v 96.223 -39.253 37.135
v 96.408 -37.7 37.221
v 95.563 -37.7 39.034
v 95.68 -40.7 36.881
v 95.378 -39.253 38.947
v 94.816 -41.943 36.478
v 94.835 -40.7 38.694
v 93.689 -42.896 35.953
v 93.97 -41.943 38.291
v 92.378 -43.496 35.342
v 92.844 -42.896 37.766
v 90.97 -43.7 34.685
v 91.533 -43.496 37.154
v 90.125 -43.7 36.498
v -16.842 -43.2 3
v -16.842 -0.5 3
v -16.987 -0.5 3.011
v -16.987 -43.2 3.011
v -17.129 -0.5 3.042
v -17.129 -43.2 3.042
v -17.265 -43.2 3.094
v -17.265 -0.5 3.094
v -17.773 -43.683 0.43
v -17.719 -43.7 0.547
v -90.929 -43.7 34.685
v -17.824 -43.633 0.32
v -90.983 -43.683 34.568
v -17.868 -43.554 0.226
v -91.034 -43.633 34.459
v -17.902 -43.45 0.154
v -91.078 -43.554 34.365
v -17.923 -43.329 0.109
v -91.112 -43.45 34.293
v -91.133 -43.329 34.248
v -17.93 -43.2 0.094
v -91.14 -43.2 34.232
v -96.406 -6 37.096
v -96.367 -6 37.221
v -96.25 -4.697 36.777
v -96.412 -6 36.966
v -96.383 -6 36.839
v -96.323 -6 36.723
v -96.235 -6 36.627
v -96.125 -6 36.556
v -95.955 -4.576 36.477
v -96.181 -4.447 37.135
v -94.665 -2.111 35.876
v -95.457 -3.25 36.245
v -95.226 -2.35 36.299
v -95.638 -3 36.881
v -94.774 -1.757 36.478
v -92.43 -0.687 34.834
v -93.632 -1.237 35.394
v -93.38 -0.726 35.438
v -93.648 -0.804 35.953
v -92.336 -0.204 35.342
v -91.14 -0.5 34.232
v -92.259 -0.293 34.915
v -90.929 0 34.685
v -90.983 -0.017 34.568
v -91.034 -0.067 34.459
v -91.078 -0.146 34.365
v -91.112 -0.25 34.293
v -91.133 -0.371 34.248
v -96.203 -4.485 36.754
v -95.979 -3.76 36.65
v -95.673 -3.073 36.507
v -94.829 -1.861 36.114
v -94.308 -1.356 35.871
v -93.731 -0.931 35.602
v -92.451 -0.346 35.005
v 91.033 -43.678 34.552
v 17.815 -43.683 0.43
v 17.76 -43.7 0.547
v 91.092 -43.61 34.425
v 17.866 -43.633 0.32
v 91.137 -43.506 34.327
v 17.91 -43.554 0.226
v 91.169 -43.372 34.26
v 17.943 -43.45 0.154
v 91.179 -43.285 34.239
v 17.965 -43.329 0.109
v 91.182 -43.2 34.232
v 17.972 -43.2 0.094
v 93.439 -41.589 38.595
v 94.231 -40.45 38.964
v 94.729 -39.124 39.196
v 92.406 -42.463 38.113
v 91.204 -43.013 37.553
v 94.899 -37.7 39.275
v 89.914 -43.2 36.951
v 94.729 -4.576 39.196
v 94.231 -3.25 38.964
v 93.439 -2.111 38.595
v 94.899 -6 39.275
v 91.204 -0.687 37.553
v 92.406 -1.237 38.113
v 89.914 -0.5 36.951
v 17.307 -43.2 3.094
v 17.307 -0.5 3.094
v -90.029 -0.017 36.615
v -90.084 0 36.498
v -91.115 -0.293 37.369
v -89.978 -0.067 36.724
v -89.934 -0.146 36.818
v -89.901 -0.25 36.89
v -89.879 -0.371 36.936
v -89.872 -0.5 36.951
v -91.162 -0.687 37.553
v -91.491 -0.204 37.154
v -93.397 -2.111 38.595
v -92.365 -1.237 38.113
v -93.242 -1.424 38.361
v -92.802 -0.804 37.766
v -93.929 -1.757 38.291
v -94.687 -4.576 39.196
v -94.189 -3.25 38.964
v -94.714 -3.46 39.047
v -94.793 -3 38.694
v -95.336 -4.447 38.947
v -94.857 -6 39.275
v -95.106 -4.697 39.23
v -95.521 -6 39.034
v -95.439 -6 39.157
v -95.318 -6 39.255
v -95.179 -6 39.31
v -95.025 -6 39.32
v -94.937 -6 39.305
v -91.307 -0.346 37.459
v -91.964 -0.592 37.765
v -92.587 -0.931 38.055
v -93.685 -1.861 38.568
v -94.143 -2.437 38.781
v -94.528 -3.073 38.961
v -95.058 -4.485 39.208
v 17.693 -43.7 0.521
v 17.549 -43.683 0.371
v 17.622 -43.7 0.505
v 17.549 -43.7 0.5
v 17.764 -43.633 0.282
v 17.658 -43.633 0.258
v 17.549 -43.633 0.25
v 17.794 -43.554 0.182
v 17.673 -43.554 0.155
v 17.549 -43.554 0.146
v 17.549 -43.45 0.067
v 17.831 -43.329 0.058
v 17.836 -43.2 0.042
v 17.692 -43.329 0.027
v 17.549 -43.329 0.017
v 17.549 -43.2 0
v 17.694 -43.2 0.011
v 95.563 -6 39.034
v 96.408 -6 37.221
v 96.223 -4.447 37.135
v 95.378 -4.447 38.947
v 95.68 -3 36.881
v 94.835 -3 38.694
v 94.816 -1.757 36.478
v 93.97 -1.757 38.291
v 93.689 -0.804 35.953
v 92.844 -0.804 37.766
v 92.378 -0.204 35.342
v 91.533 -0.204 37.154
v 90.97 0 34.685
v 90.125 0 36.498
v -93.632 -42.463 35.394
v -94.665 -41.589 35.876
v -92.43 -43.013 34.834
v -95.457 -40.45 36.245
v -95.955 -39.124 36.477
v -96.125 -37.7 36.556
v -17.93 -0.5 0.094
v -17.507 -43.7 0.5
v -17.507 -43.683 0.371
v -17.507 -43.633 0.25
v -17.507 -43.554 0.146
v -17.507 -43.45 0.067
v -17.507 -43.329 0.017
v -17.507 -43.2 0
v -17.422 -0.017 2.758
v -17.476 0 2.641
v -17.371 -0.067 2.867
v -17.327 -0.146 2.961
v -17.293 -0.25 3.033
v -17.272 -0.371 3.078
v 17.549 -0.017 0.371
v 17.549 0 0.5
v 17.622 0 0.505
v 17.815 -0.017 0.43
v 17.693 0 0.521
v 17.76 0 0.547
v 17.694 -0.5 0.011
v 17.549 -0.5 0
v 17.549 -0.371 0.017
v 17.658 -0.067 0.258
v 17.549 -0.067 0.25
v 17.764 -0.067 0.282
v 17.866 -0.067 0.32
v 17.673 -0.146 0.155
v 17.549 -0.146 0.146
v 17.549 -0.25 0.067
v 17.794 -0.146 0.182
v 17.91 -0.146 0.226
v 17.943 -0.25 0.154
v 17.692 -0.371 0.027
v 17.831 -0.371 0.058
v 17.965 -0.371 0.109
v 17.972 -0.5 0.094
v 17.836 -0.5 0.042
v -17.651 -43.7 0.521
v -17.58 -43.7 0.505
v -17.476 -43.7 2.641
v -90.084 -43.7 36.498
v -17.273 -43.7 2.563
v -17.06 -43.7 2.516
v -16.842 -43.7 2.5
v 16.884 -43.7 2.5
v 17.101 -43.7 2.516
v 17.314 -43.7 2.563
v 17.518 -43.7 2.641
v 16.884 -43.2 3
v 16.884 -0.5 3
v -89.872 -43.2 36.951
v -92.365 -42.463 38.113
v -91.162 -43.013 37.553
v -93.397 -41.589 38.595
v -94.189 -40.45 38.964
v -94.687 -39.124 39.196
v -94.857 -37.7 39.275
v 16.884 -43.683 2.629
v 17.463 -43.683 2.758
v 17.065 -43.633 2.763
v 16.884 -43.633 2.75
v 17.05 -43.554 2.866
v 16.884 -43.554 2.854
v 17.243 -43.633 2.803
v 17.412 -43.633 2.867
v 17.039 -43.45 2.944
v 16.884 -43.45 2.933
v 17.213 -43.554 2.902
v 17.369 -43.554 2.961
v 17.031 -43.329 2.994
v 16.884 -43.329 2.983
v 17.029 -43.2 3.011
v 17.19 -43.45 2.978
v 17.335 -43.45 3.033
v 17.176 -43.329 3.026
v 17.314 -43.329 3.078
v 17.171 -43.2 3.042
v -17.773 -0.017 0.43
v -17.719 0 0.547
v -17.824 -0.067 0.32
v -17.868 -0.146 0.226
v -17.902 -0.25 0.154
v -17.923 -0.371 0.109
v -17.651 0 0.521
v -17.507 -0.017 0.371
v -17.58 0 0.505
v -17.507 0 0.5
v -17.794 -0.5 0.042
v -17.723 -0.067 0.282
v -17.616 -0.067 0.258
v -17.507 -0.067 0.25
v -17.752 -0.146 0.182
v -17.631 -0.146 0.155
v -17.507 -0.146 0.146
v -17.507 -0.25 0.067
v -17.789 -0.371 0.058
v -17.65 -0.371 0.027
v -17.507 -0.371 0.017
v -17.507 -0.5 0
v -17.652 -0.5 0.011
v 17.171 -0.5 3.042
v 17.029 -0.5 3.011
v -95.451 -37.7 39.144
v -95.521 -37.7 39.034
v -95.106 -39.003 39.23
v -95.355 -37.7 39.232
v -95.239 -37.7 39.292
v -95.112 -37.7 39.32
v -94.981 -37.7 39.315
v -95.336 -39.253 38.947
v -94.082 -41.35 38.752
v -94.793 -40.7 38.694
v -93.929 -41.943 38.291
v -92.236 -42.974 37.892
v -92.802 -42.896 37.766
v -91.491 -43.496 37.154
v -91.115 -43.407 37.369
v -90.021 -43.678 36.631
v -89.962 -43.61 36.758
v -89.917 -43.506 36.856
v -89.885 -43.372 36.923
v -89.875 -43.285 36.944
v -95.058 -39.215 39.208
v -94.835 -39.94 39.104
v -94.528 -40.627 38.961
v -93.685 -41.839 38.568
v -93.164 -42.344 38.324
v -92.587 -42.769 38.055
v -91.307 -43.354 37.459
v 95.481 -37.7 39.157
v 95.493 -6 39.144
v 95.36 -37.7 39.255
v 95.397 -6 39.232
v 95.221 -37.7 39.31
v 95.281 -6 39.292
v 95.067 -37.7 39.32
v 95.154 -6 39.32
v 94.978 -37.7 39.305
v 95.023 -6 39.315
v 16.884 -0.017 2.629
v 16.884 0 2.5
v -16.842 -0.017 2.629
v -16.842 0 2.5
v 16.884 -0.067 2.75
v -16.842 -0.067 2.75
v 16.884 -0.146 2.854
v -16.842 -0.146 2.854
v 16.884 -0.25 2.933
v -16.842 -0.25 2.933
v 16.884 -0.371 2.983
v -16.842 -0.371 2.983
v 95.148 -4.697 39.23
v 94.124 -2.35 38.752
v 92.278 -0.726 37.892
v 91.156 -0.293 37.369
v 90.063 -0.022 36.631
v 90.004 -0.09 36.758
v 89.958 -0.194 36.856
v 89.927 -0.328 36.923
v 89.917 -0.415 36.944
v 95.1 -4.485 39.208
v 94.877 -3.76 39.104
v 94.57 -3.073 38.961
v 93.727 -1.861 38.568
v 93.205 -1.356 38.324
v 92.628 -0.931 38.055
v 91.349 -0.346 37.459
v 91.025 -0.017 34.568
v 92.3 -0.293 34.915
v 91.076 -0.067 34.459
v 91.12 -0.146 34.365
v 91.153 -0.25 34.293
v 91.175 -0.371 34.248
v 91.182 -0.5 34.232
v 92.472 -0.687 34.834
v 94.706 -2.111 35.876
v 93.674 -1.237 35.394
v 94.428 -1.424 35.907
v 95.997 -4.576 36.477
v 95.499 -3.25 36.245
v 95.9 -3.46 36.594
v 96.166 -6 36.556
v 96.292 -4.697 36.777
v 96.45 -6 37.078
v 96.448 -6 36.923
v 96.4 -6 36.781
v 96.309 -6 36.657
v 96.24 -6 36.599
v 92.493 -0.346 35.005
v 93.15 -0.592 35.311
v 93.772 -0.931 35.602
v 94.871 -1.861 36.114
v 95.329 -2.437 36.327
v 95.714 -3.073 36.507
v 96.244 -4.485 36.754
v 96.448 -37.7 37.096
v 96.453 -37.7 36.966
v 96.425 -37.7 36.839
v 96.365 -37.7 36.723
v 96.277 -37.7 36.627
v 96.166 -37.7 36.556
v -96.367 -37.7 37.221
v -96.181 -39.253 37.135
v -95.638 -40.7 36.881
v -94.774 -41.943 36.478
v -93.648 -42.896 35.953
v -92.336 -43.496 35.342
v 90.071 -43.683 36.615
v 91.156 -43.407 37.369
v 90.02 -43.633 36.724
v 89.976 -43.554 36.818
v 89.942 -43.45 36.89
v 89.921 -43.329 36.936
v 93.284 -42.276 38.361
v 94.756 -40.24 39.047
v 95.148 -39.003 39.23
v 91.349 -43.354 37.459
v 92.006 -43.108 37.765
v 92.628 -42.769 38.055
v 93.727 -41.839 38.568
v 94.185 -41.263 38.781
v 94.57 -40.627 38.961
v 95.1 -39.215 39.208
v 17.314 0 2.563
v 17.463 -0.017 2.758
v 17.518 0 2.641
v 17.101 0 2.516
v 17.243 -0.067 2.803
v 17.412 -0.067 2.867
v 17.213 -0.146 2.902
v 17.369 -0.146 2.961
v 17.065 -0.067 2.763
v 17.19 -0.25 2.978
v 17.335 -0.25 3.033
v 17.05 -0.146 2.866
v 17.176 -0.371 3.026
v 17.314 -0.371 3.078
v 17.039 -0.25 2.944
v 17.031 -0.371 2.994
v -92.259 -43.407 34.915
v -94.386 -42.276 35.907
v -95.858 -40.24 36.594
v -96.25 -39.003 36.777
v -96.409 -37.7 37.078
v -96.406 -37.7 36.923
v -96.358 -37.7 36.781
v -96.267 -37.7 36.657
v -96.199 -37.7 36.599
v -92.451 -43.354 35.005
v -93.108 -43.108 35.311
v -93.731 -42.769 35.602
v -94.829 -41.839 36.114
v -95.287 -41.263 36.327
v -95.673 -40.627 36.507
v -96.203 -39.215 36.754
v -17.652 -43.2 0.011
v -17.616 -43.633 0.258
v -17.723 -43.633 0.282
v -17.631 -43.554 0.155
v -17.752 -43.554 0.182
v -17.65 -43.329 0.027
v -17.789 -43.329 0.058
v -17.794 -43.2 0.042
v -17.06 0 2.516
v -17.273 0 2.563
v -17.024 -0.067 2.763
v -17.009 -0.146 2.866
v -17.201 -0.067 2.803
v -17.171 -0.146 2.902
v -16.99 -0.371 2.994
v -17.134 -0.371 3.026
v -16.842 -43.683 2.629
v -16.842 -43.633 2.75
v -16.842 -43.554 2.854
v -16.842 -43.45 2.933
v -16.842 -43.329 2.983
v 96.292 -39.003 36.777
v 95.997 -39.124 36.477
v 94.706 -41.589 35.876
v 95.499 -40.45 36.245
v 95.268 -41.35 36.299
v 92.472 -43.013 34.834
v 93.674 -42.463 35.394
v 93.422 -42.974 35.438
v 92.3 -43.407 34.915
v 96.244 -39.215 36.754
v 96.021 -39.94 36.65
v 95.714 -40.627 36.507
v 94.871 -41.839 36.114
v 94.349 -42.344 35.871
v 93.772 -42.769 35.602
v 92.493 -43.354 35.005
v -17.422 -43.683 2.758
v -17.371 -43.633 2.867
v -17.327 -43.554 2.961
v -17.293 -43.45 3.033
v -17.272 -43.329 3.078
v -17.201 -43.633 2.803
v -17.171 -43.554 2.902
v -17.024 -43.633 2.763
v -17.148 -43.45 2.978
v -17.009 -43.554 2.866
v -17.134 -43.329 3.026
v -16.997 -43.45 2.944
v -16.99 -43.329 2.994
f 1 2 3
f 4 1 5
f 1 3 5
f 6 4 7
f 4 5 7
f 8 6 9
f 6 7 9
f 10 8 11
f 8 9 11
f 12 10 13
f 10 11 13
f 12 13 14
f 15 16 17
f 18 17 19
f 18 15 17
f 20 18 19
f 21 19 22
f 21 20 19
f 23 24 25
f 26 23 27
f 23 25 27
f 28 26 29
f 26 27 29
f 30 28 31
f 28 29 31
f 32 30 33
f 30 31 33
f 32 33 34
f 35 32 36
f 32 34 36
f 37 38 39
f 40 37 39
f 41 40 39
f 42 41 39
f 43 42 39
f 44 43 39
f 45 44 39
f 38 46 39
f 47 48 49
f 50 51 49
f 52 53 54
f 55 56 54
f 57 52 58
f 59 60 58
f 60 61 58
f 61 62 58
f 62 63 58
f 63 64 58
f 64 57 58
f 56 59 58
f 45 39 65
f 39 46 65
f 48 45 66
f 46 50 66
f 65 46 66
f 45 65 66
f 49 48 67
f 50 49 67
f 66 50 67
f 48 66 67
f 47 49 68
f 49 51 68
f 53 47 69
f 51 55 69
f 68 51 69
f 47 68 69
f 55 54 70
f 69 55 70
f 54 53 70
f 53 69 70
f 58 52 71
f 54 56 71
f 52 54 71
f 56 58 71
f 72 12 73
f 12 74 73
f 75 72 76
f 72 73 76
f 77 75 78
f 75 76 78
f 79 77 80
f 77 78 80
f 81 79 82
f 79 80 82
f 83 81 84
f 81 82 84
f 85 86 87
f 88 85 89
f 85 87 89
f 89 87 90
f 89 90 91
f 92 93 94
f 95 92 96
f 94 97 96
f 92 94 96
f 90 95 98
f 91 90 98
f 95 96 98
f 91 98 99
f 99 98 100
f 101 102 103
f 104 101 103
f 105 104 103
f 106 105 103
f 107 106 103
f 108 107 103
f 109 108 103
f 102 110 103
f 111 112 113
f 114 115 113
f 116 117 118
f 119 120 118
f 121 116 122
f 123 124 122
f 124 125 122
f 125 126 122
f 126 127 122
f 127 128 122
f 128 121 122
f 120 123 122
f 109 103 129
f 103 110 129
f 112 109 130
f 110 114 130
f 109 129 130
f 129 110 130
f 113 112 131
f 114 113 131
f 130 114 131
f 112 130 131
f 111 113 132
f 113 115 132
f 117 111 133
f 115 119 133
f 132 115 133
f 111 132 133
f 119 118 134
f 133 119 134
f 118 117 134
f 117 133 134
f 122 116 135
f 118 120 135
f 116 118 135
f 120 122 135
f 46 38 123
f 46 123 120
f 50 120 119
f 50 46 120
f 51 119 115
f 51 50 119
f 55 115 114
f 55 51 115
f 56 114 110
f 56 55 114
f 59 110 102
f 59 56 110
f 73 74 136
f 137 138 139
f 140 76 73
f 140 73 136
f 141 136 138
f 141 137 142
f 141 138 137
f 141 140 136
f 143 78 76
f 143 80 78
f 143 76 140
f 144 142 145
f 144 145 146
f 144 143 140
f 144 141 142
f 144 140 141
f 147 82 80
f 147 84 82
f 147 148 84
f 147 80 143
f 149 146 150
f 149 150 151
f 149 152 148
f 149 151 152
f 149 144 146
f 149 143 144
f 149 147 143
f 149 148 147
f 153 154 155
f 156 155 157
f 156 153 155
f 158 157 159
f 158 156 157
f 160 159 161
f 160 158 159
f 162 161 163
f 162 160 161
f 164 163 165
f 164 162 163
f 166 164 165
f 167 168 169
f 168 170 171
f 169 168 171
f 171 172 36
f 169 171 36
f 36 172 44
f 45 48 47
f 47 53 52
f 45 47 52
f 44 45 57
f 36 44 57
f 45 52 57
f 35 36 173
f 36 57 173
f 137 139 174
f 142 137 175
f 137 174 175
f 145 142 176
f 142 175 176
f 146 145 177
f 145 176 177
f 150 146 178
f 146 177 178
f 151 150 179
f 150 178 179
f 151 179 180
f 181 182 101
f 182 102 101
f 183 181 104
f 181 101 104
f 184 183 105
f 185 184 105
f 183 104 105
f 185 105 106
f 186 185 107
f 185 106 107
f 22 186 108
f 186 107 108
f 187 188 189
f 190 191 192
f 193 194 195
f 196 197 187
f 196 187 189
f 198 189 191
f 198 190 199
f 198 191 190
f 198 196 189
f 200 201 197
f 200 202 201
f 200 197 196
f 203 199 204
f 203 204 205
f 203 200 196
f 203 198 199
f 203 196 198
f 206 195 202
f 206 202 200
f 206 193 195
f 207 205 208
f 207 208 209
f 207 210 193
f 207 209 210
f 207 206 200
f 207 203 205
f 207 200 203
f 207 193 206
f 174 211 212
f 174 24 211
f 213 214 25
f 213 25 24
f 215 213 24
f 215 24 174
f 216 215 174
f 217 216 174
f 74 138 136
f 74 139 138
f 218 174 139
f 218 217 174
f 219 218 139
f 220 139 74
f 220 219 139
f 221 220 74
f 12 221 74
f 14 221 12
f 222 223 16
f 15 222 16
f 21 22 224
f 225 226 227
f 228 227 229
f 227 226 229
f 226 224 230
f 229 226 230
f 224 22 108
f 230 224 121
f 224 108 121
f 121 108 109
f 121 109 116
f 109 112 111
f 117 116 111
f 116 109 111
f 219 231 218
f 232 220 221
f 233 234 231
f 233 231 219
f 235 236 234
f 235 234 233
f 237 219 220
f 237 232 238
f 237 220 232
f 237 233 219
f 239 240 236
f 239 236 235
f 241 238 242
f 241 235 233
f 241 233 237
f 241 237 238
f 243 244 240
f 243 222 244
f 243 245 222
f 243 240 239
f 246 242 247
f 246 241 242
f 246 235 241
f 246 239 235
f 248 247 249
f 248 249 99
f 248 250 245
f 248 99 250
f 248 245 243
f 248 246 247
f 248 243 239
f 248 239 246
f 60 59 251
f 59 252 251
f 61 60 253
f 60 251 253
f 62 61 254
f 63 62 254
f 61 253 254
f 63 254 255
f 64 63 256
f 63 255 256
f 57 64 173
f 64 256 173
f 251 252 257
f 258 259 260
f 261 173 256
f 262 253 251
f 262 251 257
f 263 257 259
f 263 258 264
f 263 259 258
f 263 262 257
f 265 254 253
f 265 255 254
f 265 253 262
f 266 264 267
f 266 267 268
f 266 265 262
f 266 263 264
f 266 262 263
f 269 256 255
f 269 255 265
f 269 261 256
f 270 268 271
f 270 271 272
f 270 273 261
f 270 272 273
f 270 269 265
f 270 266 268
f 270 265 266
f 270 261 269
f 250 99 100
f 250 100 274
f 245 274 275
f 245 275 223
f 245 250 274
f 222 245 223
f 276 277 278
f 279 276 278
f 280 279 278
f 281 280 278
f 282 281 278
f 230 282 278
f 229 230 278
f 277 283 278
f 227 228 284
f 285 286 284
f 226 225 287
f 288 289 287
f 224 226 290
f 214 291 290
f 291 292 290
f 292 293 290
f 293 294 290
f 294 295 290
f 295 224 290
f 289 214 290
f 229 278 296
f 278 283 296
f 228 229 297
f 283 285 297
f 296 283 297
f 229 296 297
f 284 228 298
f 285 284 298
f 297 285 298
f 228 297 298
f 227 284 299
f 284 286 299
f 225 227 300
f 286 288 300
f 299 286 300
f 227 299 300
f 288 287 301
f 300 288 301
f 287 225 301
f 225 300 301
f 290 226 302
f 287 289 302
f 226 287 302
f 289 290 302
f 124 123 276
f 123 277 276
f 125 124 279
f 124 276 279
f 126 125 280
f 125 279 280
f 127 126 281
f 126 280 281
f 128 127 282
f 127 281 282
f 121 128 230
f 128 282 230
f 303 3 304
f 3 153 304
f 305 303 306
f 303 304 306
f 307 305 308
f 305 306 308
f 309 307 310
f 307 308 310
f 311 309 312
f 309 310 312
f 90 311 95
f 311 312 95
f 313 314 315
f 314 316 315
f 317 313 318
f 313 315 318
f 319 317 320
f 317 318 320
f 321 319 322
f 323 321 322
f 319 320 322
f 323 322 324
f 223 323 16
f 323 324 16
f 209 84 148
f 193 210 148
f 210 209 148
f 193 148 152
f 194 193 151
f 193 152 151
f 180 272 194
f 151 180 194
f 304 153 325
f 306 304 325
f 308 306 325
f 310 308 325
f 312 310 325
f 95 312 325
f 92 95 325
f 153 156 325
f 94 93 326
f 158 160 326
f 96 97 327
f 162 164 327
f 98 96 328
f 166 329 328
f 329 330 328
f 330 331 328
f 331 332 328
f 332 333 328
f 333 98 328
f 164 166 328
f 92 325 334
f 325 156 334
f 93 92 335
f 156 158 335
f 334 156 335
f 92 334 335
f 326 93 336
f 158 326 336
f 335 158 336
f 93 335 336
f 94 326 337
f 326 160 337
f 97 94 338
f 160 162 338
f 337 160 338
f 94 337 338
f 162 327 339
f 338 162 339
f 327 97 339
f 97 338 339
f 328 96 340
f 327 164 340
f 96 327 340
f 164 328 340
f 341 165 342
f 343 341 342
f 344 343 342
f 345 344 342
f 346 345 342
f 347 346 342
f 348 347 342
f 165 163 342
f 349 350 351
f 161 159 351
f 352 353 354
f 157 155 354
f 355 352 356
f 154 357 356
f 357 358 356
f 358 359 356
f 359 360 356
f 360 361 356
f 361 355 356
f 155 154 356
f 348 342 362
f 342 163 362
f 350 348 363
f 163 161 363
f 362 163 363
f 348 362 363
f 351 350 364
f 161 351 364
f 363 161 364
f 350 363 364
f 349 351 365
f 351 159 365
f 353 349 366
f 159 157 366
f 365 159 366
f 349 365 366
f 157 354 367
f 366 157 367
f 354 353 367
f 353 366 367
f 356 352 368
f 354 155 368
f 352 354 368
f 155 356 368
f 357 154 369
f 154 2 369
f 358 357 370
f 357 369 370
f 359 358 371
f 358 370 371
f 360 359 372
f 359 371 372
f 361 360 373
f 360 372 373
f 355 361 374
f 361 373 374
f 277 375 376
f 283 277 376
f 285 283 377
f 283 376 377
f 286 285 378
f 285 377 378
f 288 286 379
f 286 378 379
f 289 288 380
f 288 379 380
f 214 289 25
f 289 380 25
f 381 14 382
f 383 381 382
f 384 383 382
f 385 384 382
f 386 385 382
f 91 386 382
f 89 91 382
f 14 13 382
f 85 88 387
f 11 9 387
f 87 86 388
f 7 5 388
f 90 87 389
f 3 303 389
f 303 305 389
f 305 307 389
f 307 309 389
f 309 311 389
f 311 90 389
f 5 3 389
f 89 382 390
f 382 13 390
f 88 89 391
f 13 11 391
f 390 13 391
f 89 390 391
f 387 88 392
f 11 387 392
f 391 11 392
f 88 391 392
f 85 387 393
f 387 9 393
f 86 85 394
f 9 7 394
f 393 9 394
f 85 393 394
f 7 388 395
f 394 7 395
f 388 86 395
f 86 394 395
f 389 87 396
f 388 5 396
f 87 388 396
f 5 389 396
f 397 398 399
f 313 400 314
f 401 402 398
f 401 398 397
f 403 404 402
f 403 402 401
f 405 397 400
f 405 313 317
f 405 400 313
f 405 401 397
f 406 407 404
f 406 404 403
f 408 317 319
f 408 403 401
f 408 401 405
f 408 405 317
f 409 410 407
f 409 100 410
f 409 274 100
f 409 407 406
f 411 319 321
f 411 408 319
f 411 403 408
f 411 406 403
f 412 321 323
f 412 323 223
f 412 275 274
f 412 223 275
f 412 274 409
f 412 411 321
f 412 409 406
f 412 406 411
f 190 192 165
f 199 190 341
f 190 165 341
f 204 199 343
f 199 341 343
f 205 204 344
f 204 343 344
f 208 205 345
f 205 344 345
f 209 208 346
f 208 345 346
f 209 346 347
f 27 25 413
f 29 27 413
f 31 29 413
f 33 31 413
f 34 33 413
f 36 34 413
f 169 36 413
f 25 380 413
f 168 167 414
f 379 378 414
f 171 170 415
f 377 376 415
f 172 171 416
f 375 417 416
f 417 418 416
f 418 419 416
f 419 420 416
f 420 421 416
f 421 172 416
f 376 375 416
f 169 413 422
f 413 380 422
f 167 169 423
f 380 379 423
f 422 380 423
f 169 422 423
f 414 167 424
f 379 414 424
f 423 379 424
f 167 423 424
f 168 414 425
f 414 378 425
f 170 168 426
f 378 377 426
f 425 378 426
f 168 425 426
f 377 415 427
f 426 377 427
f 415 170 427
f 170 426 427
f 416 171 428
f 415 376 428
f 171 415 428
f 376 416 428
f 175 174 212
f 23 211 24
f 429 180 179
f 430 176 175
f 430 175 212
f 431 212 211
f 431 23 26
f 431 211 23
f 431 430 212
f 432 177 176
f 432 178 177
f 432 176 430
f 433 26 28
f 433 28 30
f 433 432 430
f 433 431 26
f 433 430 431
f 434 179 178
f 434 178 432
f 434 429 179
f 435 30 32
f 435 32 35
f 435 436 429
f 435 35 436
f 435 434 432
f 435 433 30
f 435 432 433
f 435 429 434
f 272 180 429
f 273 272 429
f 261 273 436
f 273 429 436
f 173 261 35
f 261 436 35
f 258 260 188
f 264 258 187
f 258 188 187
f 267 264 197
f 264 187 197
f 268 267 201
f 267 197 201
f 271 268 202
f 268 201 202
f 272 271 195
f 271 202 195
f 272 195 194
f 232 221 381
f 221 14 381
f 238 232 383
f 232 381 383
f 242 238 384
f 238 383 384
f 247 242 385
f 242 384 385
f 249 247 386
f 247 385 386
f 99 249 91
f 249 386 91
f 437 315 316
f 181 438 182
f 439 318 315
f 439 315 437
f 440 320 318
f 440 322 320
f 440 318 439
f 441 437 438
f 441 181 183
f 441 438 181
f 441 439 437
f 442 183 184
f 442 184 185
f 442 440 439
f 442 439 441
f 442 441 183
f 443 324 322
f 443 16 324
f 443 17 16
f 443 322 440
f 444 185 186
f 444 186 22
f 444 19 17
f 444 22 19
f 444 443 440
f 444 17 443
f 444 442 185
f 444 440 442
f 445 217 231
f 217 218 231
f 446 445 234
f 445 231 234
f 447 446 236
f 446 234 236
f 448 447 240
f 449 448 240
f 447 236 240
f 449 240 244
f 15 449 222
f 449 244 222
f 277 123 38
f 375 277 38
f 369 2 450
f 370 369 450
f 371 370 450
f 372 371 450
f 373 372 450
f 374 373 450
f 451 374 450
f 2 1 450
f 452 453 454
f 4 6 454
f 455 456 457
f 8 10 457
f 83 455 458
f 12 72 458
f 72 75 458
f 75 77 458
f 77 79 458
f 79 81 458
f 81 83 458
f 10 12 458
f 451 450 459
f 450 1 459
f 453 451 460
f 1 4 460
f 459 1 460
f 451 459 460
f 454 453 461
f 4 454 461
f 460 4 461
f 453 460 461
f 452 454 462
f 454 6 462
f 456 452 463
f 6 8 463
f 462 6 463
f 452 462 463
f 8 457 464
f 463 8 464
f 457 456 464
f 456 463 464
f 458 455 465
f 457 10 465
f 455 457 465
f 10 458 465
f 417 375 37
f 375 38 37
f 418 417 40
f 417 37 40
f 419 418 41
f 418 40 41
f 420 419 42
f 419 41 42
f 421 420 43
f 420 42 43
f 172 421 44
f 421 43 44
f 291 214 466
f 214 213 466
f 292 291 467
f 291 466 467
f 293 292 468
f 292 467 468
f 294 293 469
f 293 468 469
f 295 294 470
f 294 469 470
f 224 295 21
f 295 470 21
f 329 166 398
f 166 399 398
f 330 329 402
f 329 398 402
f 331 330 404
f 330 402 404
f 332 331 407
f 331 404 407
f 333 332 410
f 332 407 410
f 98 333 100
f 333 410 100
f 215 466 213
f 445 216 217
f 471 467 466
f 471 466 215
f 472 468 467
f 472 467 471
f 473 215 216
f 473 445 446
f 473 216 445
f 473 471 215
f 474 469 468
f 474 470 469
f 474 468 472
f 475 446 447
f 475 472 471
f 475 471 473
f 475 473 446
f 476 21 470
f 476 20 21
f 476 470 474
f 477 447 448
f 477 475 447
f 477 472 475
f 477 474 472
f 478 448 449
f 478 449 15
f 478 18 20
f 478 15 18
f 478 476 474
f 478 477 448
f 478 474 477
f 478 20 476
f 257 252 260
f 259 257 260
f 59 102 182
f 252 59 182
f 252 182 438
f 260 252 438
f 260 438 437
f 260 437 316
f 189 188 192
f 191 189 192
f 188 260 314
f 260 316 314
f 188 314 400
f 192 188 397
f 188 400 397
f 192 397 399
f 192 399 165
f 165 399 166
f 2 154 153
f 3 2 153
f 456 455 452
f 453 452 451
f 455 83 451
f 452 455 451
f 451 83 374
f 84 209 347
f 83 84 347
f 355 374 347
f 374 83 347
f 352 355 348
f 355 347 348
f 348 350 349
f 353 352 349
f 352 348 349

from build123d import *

# Parameters (mm, degrees)
F1_DEPTH = 43.7
F2_R     = 6
F3_R     = 1
F4_R     = 0.5


with BuildPart() as f1:
    # F0 (on Front) → F1 (new body)
    with BuildSketch(Plane.XZ):
        Polygon((-17.729146, 0), (17.770854, 0), (96.619631, 36.767789), (95.351776, 39.486712), (17.10577, 3), (-17.064062, 3), (-95.310069, 39.486712), (-96.577924, 36.767789), align=None)
    extrude(amount=F1_DEPTH)

    # F2
    f2_edges = [f1.edges().sort_by_distance(p)[0] for p in [
        (-95.943996, -43.7, 38.12725),
        (-95.943996, 0, 38.12725),
        (95.985704, 0, 38.12725),
        (95.985704, -43.7, 38.12725),
    ]]
    fillet(f2_edges, radius=F2_R)

    # F3
    f3_edges = [f1.edges().sort_by_distance(p)[0] for p in [
        (17.770854, -21.85, 0),
        (-17.729146, -21.85, 0),
        (17.10577, -21.85, 3),
        (-17.064062, -21.85, 3),
    ]]
    fillet(f3_edges, radius=F3_R)

    # F4
    f4_edges = [f1.edges().sort_by_distance(p)[0] for p in [
        (-53.568604, 0, 20.022347),
        (0.020854, 0, 3),
        (-54.535074, 0, 17.162886),
        (-17.93007, -21.85, 0.093692),
        (-94.985215, -1.757359, 36.025097),
        (-54.535074, -43.7, 17.162886),
        (-96.577924, -21.85, 36.767789),
        (-94.985215, -41.942641, 36.025097),
    ]]
    fillet(f4_edges, radius=F4_R)


solid = f1.part
